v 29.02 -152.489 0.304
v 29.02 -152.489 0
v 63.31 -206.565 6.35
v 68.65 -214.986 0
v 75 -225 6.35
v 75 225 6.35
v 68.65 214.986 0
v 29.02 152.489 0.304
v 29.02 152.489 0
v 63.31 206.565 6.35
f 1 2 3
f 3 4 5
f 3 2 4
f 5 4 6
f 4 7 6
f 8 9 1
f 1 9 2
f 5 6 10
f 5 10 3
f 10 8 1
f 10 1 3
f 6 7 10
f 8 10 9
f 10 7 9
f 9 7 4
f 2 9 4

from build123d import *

# Parameters (mm, degrees)
F1_DEPTH = 6.35
F2_SIZE  = 6.34999
F3_SIZE2 = 6.0462521685
F3_SIZE  = 34.29


# Not quite as in the source:
# - a fillet or chamfer is up to 0.001 mm smaller than in the source, because OpenCascade refuses the exact size


with BuildPart() as f1:
    # F0 (on Top) → F1 (new body)
    with BuildSketch(Plane.XY):
        Polygon((75, -225), (75, 225), (29.020415619, 152.489066124), (29.020415619, -152.489066124), align=None)
    extrude(amount=F1_DEPTH)

    # F2 (size 6.35 in the source; OpenCascade refuses exactly that, so slightly less here)
    f2_edges = [f1.edges().sort_by_distance(p)[0] for p in [
        (75, 0, 0),
    ]]
    chamfer(f2_edges, length=F2_SIZE)

    # F3
    f3_edges = [f1.edges().sort_by_distance(p)[0] for p in [
        (29.020416, 0, 6.35),
    ]]
    f3_side = f1.faces().sort_by_distance((53.482225, 0, 6.35))[0]
    chamfer(f3_edges, length=F3_SIZE, length2=F3_SIZE2, reference=f3_side)


solid = f1.part
